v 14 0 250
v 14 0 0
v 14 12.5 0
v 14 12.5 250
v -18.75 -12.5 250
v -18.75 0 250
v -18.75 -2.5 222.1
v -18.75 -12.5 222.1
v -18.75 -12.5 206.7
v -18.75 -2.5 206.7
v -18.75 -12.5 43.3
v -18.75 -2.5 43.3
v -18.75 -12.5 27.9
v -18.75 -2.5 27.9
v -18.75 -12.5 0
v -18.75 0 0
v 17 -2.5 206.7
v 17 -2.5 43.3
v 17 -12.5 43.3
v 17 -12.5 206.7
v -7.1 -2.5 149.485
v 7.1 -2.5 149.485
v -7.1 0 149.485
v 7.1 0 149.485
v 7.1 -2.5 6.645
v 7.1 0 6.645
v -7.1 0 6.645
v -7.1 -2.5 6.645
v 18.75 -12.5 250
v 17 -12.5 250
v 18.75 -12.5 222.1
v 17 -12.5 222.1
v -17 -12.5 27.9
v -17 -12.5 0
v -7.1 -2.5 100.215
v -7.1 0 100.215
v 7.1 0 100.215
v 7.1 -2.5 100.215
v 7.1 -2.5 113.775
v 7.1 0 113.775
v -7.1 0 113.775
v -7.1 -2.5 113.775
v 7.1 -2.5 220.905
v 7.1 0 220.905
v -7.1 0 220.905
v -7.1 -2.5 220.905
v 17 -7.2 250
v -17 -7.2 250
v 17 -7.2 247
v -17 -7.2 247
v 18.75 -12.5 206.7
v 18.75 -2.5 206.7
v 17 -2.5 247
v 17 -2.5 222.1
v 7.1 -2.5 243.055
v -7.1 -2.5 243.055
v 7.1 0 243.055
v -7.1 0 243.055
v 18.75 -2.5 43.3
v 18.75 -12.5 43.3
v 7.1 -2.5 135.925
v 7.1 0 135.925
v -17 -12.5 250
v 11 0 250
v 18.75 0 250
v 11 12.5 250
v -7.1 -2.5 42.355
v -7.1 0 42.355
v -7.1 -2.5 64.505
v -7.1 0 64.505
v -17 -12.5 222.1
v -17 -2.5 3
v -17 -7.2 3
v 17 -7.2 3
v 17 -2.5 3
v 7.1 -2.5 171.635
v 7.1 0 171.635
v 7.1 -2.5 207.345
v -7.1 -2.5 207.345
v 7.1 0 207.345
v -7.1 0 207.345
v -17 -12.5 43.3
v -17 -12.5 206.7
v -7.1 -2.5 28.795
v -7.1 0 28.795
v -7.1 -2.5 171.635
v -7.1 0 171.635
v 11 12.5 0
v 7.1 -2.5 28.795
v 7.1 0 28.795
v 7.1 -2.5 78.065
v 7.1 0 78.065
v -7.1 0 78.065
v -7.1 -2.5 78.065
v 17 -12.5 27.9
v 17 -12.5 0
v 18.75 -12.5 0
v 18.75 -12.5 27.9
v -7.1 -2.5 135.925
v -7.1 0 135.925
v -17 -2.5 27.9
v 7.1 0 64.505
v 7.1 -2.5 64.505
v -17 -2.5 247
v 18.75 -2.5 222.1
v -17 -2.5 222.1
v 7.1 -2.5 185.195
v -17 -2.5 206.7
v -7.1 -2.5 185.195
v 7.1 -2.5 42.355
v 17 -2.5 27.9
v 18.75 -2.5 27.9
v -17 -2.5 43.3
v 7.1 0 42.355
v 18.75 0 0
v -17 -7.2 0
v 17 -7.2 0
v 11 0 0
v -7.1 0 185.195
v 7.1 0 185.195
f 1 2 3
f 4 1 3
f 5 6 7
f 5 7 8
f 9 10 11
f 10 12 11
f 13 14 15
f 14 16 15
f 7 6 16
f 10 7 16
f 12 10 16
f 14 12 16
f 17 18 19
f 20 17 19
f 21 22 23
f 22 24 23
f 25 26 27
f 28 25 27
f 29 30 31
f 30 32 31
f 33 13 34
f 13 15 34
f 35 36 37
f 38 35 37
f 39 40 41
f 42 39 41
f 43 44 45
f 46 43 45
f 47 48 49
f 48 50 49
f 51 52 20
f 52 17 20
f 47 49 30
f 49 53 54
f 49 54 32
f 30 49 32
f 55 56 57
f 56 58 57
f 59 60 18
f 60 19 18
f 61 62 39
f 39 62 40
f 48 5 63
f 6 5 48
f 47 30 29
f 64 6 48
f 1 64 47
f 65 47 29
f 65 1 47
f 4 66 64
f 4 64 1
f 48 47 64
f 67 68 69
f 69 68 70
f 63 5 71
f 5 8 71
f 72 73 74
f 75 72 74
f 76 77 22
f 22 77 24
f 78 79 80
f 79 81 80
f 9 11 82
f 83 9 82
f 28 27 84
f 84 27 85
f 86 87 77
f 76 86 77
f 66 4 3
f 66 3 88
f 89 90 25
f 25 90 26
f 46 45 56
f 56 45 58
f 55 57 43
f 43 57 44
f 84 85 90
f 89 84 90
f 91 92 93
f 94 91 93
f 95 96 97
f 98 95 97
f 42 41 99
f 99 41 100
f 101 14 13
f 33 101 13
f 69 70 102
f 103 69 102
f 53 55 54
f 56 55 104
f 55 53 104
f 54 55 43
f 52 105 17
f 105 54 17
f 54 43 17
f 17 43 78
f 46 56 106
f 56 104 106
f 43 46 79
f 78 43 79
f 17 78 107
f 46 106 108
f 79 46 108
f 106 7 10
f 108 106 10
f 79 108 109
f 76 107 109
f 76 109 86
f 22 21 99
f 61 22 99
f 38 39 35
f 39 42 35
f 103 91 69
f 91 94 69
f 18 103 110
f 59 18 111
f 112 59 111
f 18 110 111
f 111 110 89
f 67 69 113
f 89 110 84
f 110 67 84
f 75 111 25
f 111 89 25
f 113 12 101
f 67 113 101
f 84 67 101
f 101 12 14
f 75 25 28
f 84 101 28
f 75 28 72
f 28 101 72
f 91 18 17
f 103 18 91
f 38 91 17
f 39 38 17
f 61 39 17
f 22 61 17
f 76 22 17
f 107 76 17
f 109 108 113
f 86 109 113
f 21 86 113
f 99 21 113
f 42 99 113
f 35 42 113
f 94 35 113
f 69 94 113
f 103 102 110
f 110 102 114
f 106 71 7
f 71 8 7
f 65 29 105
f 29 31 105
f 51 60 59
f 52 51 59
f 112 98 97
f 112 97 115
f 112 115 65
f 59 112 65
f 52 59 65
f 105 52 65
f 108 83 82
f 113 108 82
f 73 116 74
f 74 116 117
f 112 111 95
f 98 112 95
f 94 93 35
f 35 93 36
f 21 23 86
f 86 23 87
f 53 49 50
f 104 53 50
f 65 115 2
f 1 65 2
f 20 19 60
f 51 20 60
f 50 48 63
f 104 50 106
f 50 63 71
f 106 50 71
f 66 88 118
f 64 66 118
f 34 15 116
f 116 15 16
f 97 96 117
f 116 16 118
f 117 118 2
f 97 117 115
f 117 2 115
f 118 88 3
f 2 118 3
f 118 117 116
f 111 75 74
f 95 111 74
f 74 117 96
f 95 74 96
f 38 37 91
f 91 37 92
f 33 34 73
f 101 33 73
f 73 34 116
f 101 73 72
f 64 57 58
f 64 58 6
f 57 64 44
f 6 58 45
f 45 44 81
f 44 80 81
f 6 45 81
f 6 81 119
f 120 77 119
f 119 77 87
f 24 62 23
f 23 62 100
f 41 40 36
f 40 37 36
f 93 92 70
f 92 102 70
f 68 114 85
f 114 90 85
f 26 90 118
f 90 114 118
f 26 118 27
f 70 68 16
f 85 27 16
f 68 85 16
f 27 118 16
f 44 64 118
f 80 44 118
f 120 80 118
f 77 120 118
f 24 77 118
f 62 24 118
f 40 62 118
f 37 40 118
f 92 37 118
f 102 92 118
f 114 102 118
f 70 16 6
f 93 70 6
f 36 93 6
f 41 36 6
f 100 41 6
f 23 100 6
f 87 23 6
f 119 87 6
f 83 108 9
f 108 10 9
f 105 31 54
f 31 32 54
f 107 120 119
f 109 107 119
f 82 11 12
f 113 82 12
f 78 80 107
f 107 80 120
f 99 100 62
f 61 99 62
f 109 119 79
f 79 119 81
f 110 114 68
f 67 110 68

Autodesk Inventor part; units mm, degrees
sketch "Sketch_1" plane through (0, 0, 0) normal (0, 0, 1) x (1, 0, 0)
  line L0 (-18.75, -12.5) -> (-17, -12.5)
  line L1 (-17, -12.5) -> (-17, -7.2)
  line L2 (-17, -7.2) -> (17, -7.2)
  line L3 (17, -7.2) -> (17, -12.5)
  line L4 (17, -12.5) -> (18.75, -12.5)
  line L5 (18.75, -12.5) -> (18.75, 0)
  line L6 (18.75, 0) -> (14, 0)
  line L7 (14, 0) -> (14, 12.5)
  line L8 (14, 12.5) -> (11, 12.5)
  line L9 (11, 12.5) -> (11, 0)
  line L10 (11, 0) -> (-18.75, 0)
  line L11 (-18.75, 0) -> (-18.75, -12.5)
extrude "Extrusion1" add sketch "Sketch_1" along normal blind 250
sketch "Sketch_2" plane through (-18.75, 0, 0) normal (0, 1, 0) x (0, 0, 1)
  line L0 (6.645, 11.65) -> (28.795, 11.65)
  line L1 (28.795, 11.65) -> (28.795, 25.85)
  line L2 (28.795, 25.85) -> (6.645, 25.85)
  line L3 (6.645, 25.85) -> (6.645, 11.65)
extrude "Extrusion2" cut sketch "Sketch_2" against normal blind 8
sketch "Sketch_3" plane through (-18.75, 0, 0) normal (0, 1, 0) x (0, 0, 1)
  line L0 (42.355, 25.85) -> (42.355, 11.65)
  line L1 (42.355, 11.65) -> (64.505, 11.65)
  line L2 (64.505, 11.65) -> (64.505, 25.85)
  line L3 (64.505, 25.85) -> (42.355, 25.85)
extrude "Extrusion3" cut sketch "Sketch_3" against normal blind 8
sketch "Sketch_4" plane through (-18.75, 0, 0) normal (0, 1, 0) x (0, 0, 1)
  line L0 (78.065, 11.65) -> (100.215, 11.65)
  line L1 (100.215, 11.65) -> (100.215, 25.85)
  line L2 (100.215, 25.85) -> (78.065, 25.85)
  line L3 (78.065, 25.85) -> (78.065, 11.65)
extrude "Extrusion4" cut sketch "Sketch_4" against normal blind 8
sketch "Sketch_5" plane through (-18.75, 0, 0) normal (0, 1, 0) x (0, 0, 1)
  line L0 (113.775, 25.85) -> (113.775, 11.65)
  line L1 (113.775, 11.65) -> (135.925, 11.65)
  line L2 (135.925, 11.65) -> (135.925, 25.85)
  line L3 (135.925, 25.85) -> (113.775, 25.85)
extrude "Extrusion5" cut sketch "Sketch_5" against normal blind 8
sketch "Sketch_6" plane through (-18.75, 0, 0) normal (0, 1, 0) x (0, 0, 1)
  line L0 (149.485, 25.85) -> (149.485, 11.65)
  line L1 (149.485, 11.65) -> (171.635, 11.65)
  line L2 (171.635, 11.65) -> (171.635, 25.85)
  line L3 (171.635, 25.85) -> (149.485, 25.85)
extrude "Extrusion6" cut sketch "Sketch_6" against normal blind 8
sketch "Sketch_7" plane through (-18.75, 0, 0) normal (0, 1, 0) x (0, 0, 1)
  line L0 (185.195, 11.65) -> (207.345, 11.65)
  line L1 (207.345, 11.65) -> (207.345, 25.85)
  line L2 (207.345, 25.85) -> (185.195, 25.85)
  line L3 (185.195, 25.85) -> (185.195, 11.65)
extrude "Extrusion7" cut sketch "Sketch_7" against normal blind 8
sketch "Sketch_8" plane through (-18.75, 0, 0) normal (0, 1, 0) x (0, 0, 1)
  line L0 (220.905, 25.85) -> (220.905, 11.65)
  line L1 (220.905, 11.65) -> (243.055, 11.65)
  line L2 (243.055, 11.65) -> (243.055, 25.85)
  line L3 (243.055, 25.85) -> (220.905, 25.85)
extrude "Extrusion8" cut sketch "Sketch_8" against normal blind 8
sketch "Sketch_10" plane through (-18.75, -12.5, 0) normal (-1, 0, 0) x (0, 0, 1)
  line L0 (27.9, 10) -> (27.9, 0)
  line L1 (27.9, 0) -> (43.3, 0)
  line L2 (43.3, 0) -> (43.3, 10)
  line L3 (43.3, 10) -> (27.9, 10)
extrude "Extrusion9" cut sketch "Sketch_10" against normal blind 37.5
sketch "Sketch_11" plane through (-18.75, -12.5, 0) normal (-1, 0, 0) x (0, 0, 1)
  line L0 (206.7, 10) -> (206.7, 0)
  line L1 (206.7, 0) -> (222.1, 0)
  line L2 (222.1, 0) -> (222.1, 10)
  line L3 (222.1, 10) -> (206.7, 10)
extrude "Extrusion10" cut sketch "Sketch_11" against normal blind 37.5
sketch "Sketch_13" plane through (-17, -7.2, 0) normal (0, -1, 0) x (1, 0, 0)
  line L0 (0, 247) -> (0, 3)
  line L1 (0, 3) -> (34, 3)
  line L2 (34, 3) -> (34, 247)
  line L3 (34, 247) -> (0, 247)
extrude "Extrusion11" cut sketch "Sketch_13" against normal blind 4.7
ref_plane "p_XY" through (0, 0, 0) normal (0, 1, 0) x (1, 0, 0)
ref_plane "p_YZ" through (0, 0, 0) normal (1, 0, 0) x (0, 0, -1)
ref_plane "p_ZX" through (0, 0, 0) normal (0, 0, -1) x (0, 1, 0)
ref_plane "p1_XY" through (0, -9.5, 17.72) normal (1, 0, 0) x (0, 0, -1)
ref_plane "p1_YZ" through (0, -9.5, 17.72) normal (0, 0, -1) x (0, 1, 0)
ref_plane "p1_ZX" through (0, -9.5, 17.72) normal (0, 1, 0) x (1, 0, 0)
ref_plane "p2_XY" through (0, -9.5, 53.43) normal (1, 0, 0) x (0, 0, -1)
ref_plane "p2_YZ" through (0, -9.5, 53.43) normal (0, 0, -1) x (0, 1, 0)
ref_plane "p2_ZX" through (0, -9.5, 53.43) normal (0, 1, 0) x (1, 0, 0)
ref_plane "p3_XY" through (0, -9.5, 89.14) normal (1, 0, 0) x (0, 0, -1)
ref_plane "p3_YZ" through (0, -9.5, 89.14) normal (0, 0, -1) x (0, 1, 0)
ref_plane "p3_ZX" through (0, -9.5, 89.14) normal (0, 1, 0) x (1, 0, 0)
ref_plane "p4_XY" through (0, -9.5, 124.85) normal (1, 0, 0) x (0, 0, -1)
ref_plane "p4_YZ" through (0, -9.5, 124.85) normal (0, 0, -1) x (0, 1, 0)
ref_plane "p4_ZX" through (0, -9.5, 124.85) normal (0, 1, 0) x (1, 0, 0)
ref_plane "p5_XY" through (0, -9.5, 160.56) normal (1, 0, 0) x (0, 0, -1)
ref_plane "p5_YZ" through (0, -9.5, 160.56) normal (0, 0, -1) x (0, 1, 0)
ref_plane "p5_ZX" through (0, -9.5, 160.56) normal (0, 1, 0) x (1, 0, 0)
ref_plane "p6_XY" through (0, -9.5, 196.27) normal (1, 0, 0) x (0, 0, -1)
ref_plane "p6_YZ" through (0, -9.5, 196.27) normal (0, 0, -1) x (0, 1, 0)
ref_plane "p6_ZX" through (0, -9.5, 196.27) normal (0, 1, 0) x (1, 0, 0)
ref_plane "p7_XY" through (0, -9.5, 231.98) normal (1, 0, 0) x (0, 0, -1)
ref_plane "p7_YZ" through (0, -9.5, 231.98) normal (0, 0, -1) x (0, 1, 0)
ref_plane "p7_ZX" through (0, -9.5, 231.98) normal (0, 1, 0) x (1, 0, 0)
properties part number "PRO10282 Rollenleiste Abdeckung mit Seitenfuehrung 250"
